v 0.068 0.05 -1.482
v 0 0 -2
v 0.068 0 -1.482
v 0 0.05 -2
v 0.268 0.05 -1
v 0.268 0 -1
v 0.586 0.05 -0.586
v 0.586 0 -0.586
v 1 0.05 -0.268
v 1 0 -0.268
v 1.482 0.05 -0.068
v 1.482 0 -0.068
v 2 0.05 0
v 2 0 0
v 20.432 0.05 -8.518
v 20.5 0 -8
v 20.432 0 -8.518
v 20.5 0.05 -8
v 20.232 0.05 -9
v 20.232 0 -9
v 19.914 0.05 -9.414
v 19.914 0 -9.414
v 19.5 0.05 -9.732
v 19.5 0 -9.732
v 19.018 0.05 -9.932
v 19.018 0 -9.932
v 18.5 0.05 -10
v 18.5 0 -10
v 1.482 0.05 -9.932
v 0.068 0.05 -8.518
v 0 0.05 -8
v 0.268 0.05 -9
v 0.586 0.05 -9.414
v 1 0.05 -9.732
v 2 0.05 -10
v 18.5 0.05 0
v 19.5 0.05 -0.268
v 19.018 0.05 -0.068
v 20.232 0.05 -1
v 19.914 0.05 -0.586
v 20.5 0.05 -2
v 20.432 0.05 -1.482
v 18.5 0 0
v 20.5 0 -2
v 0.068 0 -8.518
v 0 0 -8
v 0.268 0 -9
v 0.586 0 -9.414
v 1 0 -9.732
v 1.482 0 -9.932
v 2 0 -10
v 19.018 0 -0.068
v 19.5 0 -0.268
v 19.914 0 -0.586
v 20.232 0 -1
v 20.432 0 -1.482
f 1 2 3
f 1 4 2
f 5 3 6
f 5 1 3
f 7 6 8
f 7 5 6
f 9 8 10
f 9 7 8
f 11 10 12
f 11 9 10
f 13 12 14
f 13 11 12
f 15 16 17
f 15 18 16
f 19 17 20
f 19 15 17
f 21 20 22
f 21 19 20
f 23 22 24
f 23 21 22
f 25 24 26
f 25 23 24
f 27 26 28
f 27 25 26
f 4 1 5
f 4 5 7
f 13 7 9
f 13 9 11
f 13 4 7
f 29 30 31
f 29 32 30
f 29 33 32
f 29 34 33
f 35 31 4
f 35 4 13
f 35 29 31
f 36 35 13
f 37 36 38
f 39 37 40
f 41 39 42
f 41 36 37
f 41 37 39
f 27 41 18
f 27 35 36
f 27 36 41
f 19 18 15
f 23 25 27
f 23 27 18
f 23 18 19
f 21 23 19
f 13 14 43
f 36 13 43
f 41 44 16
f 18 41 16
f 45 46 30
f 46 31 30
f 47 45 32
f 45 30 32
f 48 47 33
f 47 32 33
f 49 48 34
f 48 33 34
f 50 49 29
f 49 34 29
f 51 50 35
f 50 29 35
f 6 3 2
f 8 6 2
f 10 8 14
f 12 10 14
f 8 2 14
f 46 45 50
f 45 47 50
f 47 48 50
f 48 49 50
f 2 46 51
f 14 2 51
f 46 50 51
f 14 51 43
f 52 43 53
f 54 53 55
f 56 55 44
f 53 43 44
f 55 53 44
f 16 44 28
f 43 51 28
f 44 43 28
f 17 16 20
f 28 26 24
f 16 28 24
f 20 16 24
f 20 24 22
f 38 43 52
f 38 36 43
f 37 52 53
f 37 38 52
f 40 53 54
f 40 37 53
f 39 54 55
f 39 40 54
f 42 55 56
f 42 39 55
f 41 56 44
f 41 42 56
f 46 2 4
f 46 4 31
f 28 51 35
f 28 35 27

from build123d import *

# Parameters (mm, degrees)
ESQUISSE1_W        = 20.5
ESQUISSE1_H        = 10
BOSS_EXTRU_1_DEPTH = 0.05
CONG_1_R           = 2


with BuildPart() as part:
    # Esquisse1 → Boss.-Extru.1 (new body)
    with BuildSketch(Plane(origin=(0, 0, 0), x_dir=(1, 0, 0), z_dir=(0, 1, 0))):
        with Locations((10.25, 5)):
            Rectangle(ESQUISSE1_W, ESQUISSE1_H)
    extrude(amount=BOSS_EXTRU_1_DEPTH)

    # Congé1
    cong_1_edges = [part.edges().sort_by_distance(p)[0] for p in [
        (0, 0.025, -10),
        (20.5, 0.025, -10),
        (20.5, 0.025, 0),
        (0, 0.025, 0),
    ]]
    fillet(cong_1_edges, radius=CONG_1_R)


solid = part.part
